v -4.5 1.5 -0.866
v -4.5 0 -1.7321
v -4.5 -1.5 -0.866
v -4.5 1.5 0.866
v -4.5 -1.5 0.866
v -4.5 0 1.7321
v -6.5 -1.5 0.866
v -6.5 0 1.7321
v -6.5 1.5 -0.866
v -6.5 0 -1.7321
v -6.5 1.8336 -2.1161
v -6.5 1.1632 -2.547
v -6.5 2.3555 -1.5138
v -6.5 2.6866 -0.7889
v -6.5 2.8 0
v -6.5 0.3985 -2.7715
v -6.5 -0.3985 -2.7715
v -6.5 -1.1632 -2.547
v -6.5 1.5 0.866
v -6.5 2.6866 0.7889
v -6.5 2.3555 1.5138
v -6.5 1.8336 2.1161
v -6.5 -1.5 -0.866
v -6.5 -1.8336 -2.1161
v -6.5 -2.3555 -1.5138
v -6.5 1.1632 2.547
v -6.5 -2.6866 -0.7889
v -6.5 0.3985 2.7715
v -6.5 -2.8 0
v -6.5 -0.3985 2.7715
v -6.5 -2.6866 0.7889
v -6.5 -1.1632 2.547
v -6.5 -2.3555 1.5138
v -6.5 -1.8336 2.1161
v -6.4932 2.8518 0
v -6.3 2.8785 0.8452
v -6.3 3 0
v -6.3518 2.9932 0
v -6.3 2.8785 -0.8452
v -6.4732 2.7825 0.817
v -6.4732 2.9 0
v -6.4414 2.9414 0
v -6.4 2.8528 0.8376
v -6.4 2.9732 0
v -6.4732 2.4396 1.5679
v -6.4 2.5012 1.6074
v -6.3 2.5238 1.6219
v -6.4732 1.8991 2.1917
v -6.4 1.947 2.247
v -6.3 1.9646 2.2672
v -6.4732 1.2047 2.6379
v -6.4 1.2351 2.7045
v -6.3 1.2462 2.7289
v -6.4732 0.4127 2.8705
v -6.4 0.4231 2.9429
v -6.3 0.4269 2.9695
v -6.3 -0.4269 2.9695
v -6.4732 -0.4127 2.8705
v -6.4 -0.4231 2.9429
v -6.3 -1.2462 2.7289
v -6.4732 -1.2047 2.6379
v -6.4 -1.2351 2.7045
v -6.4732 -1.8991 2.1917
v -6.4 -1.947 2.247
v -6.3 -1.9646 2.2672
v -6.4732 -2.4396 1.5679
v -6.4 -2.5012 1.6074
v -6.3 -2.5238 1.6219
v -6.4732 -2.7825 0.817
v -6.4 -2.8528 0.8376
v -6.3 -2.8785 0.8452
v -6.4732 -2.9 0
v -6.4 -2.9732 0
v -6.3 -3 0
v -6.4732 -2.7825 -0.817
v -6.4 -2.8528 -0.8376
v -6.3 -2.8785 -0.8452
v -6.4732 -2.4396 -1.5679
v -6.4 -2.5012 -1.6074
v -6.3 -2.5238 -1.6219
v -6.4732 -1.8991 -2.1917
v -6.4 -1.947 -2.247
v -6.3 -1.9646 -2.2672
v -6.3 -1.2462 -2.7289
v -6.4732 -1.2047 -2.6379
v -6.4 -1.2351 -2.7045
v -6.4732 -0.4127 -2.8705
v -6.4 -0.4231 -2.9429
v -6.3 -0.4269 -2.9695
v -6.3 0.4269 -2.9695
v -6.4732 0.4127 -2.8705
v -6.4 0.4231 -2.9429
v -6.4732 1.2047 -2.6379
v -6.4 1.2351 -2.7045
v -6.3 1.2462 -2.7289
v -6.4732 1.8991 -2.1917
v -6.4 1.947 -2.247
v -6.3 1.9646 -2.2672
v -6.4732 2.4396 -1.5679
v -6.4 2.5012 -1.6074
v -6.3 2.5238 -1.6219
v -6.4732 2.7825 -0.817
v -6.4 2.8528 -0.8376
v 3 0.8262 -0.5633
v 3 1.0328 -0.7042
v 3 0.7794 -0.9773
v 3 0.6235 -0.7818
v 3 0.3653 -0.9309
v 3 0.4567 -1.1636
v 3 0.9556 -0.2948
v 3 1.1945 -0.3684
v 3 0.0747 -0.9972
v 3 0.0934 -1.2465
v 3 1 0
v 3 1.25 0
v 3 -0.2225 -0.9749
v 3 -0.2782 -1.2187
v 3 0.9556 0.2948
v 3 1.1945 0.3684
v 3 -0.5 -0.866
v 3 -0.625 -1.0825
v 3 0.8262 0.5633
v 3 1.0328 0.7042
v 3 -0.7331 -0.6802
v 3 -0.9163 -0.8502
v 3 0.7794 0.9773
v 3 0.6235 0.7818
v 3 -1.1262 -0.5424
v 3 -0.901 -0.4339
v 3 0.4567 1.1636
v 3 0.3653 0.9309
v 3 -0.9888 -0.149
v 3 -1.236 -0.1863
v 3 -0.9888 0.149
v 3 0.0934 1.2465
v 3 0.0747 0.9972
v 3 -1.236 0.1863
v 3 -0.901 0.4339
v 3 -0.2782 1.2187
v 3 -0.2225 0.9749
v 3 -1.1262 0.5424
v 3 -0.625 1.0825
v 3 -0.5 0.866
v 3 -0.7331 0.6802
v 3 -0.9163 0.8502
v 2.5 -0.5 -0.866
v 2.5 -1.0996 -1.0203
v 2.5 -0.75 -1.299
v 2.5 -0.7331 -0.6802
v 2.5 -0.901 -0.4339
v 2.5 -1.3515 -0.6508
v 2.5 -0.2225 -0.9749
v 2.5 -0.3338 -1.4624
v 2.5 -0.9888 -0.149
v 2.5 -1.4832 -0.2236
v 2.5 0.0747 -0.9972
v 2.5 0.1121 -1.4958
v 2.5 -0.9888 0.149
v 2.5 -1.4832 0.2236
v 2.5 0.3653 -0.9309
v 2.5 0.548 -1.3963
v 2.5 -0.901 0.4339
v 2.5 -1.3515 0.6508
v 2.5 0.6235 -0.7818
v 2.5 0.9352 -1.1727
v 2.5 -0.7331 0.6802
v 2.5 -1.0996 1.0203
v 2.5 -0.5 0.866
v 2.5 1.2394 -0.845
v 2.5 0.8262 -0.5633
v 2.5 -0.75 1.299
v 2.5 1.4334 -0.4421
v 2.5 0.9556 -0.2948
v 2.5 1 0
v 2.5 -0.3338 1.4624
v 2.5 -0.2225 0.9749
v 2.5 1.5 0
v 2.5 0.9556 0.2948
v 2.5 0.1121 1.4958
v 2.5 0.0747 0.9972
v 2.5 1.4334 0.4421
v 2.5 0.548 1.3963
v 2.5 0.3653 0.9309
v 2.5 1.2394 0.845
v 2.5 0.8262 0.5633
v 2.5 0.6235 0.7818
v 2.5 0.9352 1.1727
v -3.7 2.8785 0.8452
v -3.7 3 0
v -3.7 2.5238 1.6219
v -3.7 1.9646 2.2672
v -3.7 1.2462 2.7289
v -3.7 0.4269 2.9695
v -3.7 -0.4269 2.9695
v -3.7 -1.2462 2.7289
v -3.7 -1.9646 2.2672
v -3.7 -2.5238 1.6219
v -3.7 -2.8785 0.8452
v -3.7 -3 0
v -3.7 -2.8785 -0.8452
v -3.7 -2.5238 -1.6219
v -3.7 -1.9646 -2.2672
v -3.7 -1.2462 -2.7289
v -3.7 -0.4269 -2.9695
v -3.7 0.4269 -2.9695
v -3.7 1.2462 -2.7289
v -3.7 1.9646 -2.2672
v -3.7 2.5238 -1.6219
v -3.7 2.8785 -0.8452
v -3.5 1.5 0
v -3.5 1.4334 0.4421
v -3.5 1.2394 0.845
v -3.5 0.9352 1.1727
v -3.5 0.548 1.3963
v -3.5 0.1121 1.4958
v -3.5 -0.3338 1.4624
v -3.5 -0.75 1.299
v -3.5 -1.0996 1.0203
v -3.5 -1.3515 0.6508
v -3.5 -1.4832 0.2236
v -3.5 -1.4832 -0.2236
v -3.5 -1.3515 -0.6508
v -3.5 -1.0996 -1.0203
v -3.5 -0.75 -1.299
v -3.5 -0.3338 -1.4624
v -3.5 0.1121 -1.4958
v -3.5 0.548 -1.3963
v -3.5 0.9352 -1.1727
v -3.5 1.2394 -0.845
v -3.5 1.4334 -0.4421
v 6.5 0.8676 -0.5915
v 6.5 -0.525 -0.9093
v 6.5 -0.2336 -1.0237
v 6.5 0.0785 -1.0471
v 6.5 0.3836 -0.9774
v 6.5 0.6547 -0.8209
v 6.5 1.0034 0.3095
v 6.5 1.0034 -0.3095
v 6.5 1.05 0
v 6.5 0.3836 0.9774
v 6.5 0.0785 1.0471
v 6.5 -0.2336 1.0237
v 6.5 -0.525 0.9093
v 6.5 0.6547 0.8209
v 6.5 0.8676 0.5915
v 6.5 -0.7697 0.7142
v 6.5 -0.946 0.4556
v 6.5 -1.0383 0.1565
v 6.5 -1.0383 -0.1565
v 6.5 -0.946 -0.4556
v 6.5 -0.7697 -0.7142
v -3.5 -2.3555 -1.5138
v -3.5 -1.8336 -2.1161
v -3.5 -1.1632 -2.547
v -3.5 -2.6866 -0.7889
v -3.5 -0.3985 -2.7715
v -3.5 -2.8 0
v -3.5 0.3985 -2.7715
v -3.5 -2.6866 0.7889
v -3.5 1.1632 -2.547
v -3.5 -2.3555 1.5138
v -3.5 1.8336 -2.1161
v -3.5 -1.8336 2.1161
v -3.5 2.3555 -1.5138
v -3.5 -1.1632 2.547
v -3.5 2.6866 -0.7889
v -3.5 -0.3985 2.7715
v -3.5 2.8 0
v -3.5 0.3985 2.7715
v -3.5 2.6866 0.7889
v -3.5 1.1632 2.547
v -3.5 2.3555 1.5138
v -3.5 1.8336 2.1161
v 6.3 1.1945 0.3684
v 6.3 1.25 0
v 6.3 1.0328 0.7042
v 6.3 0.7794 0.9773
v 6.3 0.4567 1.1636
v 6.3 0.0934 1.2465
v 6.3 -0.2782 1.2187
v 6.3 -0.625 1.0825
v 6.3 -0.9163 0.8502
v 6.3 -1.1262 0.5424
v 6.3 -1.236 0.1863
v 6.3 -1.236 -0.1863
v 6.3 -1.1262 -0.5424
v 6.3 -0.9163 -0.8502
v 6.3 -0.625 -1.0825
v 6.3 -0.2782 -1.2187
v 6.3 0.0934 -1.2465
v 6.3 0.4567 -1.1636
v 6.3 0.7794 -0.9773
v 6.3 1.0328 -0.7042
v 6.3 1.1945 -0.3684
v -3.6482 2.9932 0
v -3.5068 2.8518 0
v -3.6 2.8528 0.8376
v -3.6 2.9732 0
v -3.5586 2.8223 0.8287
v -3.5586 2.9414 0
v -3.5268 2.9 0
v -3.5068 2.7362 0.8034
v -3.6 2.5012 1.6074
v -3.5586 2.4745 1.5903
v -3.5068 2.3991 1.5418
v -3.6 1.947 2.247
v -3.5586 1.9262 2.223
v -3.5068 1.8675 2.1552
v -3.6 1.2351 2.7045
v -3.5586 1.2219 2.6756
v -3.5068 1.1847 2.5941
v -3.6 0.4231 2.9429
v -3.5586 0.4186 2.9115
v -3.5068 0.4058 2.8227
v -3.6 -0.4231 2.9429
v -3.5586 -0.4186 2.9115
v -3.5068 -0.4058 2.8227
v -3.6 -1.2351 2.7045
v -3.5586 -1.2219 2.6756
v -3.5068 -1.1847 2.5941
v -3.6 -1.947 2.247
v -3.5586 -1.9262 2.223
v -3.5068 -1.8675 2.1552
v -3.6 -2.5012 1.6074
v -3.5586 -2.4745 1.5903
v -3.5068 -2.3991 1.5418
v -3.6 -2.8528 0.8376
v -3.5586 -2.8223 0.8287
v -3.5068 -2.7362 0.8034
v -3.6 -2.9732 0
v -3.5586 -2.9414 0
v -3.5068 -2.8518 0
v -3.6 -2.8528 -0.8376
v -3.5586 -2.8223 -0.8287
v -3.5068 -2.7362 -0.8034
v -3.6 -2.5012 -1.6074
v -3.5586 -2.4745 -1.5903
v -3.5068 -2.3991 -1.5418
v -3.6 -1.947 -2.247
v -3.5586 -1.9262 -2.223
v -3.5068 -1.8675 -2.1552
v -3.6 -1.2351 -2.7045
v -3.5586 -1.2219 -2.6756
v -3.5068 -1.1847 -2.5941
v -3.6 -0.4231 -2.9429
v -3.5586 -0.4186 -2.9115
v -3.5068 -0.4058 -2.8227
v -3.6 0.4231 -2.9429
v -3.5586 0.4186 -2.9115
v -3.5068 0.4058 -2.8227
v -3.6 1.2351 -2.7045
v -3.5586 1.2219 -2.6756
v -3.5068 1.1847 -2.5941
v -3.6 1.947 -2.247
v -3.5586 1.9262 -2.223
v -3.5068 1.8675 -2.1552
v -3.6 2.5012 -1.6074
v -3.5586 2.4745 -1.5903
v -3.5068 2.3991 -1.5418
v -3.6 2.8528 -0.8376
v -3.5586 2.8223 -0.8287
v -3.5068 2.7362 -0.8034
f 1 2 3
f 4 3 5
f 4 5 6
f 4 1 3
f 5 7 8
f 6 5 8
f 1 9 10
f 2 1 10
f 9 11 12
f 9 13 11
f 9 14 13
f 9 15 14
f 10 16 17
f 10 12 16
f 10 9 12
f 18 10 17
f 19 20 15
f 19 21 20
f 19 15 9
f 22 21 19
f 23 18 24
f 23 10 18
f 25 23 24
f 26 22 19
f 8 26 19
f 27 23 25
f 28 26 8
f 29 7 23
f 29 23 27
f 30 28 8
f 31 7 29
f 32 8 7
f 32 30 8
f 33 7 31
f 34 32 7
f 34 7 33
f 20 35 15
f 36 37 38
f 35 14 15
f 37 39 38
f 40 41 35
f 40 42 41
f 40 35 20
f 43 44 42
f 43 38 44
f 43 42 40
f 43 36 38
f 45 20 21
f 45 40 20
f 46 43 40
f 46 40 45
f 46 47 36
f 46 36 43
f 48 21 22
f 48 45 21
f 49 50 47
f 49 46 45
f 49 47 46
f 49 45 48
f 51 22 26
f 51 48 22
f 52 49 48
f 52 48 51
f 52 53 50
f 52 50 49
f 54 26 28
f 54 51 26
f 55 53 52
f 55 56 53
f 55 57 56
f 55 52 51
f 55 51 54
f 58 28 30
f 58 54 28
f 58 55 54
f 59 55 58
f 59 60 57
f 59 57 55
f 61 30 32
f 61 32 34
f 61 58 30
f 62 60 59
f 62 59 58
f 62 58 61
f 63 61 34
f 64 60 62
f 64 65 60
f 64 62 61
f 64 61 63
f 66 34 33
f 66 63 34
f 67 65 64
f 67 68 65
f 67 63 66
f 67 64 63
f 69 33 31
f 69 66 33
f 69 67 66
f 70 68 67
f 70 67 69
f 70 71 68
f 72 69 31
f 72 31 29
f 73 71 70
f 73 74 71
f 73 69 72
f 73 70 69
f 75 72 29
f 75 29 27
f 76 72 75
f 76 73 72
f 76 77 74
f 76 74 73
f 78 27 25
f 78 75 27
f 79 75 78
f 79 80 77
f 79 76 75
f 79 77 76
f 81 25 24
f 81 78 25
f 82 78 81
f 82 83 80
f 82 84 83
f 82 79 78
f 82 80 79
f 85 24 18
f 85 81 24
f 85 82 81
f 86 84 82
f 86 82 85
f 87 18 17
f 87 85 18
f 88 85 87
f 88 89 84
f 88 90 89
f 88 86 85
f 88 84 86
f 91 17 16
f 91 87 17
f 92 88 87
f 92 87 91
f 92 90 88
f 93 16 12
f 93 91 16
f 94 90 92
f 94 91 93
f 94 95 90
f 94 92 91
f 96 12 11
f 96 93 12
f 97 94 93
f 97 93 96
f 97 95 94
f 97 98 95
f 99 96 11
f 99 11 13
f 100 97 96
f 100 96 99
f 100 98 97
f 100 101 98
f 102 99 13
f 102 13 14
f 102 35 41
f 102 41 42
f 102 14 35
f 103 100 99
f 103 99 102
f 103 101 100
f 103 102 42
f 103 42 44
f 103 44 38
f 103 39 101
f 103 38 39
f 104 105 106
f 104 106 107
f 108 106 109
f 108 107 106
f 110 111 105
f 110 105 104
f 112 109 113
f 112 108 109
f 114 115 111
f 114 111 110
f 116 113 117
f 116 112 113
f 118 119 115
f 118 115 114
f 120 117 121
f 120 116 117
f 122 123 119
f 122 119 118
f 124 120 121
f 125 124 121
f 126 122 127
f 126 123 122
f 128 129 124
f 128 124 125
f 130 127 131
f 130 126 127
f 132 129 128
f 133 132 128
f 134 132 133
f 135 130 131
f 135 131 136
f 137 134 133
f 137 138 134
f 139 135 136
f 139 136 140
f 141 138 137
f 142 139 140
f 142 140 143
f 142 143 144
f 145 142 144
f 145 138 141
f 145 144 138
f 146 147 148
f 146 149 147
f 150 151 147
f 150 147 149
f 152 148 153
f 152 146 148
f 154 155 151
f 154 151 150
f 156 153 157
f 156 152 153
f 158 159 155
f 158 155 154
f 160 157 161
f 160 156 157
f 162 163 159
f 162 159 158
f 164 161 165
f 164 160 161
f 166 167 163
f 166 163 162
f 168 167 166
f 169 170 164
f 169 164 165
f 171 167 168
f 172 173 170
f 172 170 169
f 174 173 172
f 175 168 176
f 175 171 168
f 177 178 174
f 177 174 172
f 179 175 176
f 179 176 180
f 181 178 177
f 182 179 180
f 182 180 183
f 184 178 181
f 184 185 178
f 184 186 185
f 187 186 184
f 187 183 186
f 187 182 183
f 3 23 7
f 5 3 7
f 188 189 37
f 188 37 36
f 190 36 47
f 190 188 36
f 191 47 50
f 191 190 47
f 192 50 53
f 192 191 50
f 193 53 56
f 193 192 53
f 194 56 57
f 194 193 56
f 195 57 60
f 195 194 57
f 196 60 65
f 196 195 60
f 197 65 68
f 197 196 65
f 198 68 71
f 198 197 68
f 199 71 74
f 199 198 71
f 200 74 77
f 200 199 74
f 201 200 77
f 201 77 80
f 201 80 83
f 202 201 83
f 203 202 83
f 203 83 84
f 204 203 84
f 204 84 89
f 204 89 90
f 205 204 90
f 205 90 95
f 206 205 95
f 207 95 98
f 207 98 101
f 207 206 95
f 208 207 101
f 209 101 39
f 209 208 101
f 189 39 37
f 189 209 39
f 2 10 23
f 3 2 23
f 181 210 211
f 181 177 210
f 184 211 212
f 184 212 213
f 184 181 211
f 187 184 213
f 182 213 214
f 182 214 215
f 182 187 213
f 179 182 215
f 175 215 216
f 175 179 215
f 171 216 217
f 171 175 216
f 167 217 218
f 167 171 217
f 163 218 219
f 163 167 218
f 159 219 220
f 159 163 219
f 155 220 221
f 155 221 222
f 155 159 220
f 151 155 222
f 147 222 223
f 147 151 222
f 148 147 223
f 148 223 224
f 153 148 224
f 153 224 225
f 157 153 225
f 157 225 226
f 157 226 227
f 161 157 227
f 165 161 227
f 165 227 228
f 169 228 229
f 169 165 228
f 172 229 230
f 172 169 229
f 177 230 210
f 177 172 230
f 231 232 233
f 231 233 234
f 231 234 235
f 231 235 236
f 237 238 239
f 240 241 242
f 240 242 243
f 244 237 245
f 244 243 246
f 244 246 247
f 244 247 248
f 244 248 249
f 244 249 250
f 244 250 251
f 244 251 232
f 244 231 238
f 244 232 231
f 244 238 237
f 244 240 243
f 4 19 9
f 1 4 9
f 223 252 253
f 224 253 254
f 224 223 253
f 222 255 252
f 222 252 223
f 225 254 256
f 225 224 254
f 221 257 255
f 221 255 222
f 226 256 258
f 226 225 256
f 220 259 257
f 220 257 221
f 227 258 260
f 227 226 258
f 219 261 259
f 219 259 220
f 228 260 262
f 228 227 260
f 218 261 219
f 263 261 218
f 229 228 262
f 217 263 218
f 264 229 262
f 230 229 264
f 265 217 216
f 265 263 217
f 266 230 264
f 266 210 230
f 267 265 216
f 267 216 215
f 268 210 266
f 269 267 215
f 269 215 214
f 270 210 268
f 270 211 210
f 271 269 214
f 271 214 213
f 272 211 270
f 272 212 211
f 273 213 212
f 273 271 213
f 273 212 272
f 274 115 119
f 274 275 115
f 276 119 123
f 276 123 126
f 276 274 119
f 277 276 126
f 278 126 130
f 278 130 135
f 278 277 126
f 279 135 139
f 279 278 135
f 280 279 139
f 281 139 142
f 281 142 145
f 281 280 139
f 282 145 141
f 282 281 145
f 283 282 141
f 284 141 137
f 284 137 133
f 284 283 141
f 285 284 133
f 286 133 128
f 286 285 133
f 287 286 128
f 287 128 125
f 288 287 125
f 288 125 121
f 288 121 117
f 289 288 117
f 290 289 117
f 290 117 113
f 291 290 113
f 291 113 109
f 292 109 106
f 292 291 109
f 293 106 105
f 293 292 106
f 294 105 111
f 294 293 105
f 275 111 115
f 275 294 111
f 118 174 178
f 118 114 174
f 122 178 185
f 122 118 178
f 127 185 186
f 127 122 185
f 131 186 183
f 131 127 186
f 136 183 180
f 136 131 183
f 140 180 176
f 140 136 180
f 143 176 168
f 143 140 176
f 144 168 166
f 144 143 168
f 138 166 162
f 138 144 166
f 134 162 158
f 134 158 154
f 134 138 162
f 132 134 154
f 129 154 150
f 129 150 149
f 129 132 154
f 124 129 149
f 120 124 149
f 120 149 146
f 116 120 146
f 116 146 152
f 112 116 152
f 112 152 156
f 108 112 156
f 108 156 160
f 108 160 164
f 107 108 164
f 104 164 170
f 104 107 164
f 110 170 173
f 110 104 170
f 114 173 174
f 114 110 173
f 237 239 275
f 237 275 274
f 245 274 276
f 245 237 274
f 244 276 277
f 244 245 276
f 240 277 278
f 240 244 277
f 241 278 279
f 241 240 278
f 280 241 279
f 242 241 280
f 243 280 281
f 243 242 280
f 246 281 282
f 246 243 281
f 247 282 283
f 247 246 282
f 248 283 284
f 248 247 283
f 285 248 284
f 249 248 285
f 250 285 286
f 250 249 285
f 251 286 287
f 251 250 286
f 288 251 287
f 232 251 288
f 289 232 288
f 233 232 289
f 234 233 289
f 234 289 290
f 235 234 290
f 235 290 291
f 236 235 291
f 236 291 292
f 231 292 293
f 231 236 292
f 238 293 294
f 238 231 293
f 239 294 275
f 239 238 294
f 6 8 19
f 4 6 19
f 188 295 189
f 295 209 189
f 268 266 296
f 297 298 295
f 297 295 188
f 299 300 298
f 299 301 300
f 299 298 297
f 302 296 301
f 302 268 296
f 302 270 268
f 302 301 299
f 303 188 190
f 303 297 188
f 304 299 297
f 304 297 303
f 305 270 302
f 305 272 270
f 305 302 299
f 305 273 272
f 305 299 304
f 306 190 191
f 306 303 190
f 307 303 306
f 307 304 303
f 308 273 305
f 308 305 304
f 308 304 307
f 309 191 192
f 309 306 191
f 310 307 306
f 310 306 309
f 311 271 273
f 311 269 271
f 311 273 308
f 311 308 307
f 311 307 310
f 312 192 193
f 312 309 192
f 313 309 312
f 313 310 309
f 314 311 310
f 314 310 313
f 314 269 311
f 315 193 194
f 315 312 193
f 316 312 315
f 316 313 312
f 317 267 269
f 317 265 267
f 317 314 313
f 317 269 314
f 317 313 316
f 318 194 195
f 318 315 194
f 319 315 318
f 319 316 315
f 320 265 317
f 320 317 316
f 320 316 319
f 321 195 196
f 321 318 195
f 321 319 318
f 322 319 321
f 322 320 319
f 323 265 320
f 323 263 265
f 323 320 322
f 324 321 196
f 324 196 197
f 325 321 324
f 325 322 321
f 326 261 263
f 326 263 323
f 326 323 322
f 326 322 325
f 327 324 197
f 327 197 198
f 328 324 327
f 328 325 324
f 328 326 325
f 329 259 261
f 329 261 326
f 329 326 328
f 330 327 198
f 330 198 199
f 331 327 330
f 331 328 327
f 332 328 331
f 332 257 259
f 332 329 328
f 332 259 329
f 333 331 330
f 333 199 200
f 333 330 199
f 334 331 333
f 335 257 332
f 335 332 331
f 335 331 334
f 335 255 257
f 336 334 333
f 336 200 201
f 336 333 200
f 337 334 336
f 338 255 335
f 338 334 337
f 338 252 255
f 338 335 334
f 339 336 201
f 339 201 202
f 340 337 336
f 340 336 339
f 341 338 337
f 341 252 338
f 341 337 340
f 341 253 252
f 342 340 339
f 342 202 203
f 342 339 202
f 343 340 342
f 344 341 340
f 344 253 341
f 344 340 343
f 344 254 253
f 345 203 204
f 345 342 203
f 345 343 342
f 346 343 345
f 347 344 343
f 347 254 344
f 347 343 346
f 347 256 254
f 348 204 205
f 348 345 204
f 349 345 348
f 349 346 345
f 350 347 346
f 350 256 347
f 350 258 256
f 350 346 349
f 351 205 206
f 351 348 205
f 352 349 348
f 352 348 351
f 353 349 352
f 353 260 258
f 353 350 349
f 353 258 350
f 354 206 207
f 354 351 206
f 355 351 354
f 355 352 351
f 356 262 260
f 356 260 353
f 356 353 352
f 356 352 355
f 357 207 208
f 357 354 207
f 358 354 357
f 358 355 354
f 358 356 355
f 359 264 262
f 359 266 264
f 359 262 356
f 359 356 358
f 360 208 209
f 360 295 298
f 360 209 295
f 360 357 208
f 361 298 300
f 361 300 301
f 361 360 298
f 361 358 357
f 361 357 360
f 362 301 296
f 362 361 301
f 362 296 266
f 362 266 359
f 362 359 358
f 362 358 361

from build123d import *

# Parameters (mm, degrees)
FILLET_1_R          = 0.2
CHAMFER_1_SIZE      = 0.2
SKETCH_3_W          = 0.5
SKETCH_3_H          = 0.25
CUT_EXTRUDE_1_DEPTH = 2


with BuildPart() as part:
    # 草图1 → 旋转1 (revolve)
    with BuildSketch(Plane.XY):
        Polygon((-6.5, 0), (-6.5, 3), (-3.5, 3), (-3.5, 1.5), (2.5, 1.5), (2.5, 1.25), (6.5, 1.25), (6.5, 0), align=None)
    revolve(axis=Axis((-6.5, 0, 0), (1, 0, 0)))

    # 圆角1
    fillet_1_edges = [part.edges().sort_by_distance(p)[0] for p in [
        (-3.5, -3, 0),
        (-6.5, -3, 0),
    ]]
    fillet(fillet_1_edges, radius=FILLET_1_R)

    # 倒角1
    chamfer_1_edges = [part.edges().sort_by_distance(p)[0] for p in [
        (6.5, -1.25, 0),
    ]]
    chamfer(chamfer_1_edges, length=CHAMFER_1_SIZE)

    # 草图3 → 切除-旋转1 (revolve, cut)
    with BuildSketch(Plane.XY):
        with Locations((2.75, 1.125)):
            Rectangle(SKETCH_3_W, SKETCH_3_H)
    revolve(axis=Axis((2.5, 0, 0), (1, 0, 0)), mode=Mode.SUBTRACT)

    # 草图4 → 切除-拉伸1 (cut)
    with BuildSketch(Plane.ZY.offset(6.5)):
        Polygon((1.732050808, 0), (0.866025404, 1.5), (-0.866025404, 1.5), (-1.732050808, 0), (-0.866025404, -1.5), (0.866025404, -1.5), align=None)
    extrude(amount=-CUT_EXTRUDE_1_DEPTH, mode=Mode.SUBTRACT)


solid = part.part
